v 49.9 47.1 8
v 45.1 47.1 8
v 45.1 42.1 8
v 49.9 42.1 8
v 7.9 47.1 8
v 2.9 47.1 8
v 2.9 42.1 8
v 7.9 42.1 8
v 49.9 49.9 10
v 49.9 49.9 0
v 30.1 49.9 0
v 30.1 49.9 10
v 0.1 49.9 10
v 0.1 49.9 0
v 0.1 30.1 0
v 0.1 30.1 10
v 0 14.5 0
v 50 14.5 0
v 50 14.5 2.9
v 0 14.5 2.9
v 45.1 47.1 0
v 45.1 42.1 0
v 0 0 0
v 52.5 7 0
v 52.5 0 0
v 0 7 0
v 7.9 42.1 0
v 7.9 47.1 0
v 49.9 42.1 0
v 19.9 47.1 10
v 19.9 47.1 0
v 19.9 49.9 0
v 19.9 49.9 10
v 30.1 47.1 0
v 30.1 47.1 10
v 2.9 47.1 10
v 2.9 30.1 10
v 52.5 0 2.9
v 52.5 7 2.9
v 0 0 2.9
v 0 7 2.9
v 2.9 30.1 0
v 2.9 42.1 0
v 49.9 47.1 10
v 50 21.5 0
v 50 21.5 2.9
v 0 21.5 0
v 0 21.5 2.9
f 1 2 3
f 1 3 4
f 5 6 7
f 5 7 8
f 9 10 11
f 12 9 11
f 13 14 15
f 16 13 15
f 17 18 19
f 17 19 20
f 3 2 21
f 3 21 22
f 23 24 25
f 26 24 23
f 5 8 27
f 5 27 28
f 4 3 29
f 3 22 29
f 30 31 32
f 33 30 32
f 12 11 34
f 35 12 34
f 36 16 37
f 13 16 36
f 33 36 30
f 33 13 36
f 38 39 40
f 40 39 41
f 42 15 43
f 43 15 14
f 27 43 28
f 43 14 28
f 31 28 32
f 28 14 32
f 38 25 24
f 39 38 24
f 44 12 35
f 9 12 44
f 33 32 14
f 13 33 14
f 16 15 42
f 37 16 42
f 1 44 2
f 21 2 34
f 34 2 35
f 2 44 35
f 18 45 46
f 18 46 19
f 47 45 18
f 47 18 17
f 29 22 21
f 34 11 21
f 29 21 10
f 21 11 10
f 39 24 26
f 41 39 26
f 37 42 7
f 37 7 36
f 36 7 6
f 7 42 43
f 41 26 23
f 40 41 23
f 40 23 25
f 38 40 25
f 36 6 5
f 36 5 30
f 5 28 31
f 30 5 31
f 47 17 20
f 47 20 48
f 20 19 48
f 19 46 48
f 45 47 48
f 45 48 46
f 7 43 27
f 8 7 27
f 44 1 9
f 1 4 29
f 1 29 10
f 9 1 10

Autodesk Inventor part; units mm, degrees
ref_plane "YZ Plane" through (0, 0, 0) normal (1, 0, 0) x (0, 1, 0)
ref_plane "XZ Plane" through (0, 0, 0) normal (0, 1, 0) x (-1, 0, 0)
ref_plane "XY Plane" through (0, 0, 0) normal (0, 0, 1) x (1, 0, 0)
sketch "Esboço1" plane through (0, 0, 0) normal (0, 0, 1) x (1, 0, 0)
  line L0 (0, 20) -> (0, 0)
  line L1 (45, 0) -> (45, 5)
  line L2 (45, 5) -> (50, 5)
  line L3 (50, 5) -> (50, 0)
  line L4 (50, 0) -> (45, 0)
  line L5 (0, 30) -> (0, 50)
  line L6 (8, 47) -> (8, 42)
  line L7 (8, 42) -> (3, 42)
  line L8 (3, 42) -> (3, 30)
  line L9 (3, 30) -> (0, 30)
  line L10 (30, 50) -> (50, 50)
  line L11 (50, 50) -> (50, 42)
  line L12 (50, 42) -> (45, 42)
  line L13 (45, 42) -> (45, 47)
  line L14 (45, 47) -> (30, 47)
  line L15 (30, 47) -> (30, 50)
  line L16 (0, 50) -> (20, 50)
  line L17 (20, 50) -> (20, 47)
  line L18 (20, 47) -> (8, 47)
  line L19 (0, 20) -> (3, 20)
  line L20 (3, 20) -> (3, 5)
  line L21 (0, 0) -> (8, 0)
  line L22 (8, 0) -> (8, 5)
  line L23 (8, 5) -> (3, 5)
  line L24 (0.1, 49.9) -> (0.1, 30.1)
  line L25 (0.1, 30.1) -> (2.9, 30.1)
  line L26 (2.9, 30.1) -> (2.9, 42.1)
  line L27 (2.9, 42.1) -> (7.9, 42.1)
  line L28 (7.9, 42.1) -> (7.9, 47.1)
  line L29 (7.9, 47.1) -> (19.9, 47.1)
  line L30 (19.9, 47.1) -> (19.9, 49.9)
  line L31 (19.9, 49.9) -> (0.1, 49.9)
  line L32 (30.1, 49.9) -> (30.1, 47.1)
  line L33 (30.1, 47.1) -> (45.1, 47.1)
  line L34 (45.1, 47.1) -> (45.1, 42.1)
  line L35 (45.1, 42.1) -> (49.9, 42.1)
  line L36 (49.9, 42.1) -> (49.9, 49.9)
  line L37 (49.9, 49.9) -> (30.1, 49.9)
  line L38 (45.1, 4.9) -> (45.1, 0.1)
  line L39 (45.1, 0.1) -> (49.9, 0.1)
  line L40 (49.9, 0.1) -> (49.9, 4.9)
  line L41 (49.9, 4.9) -> (45.1, 4.9)
  line L42 (0.1, 19.9) -> (0.1, 0.1)
  line L43 (0.1, 0.1) -> (7.9, 0.1)
  line L44 (7.9, 0.1) -> (7.9, 4.9)
  line L45 (7.9, 4.9) -> (2.9, 4.9)
  line L46 (2.9, 4.9) -> (2.9, 19.9)
  line L47 (2.9, 19.9) -> (0.1, 19.9)
  dimension "d3" = 10
  dimension "d4" = 20
  dimension "d6" = 20
  dimension "d7" = 5
  dimension "d8" = 5
  dimension "d9" = 3
  dimension "d10" = 3
  dimension "d11" = 20
  dimension "d14" = 5
  dimension "d15" = 5
  dimension "d16" = 3
  dimension "d17" = 5
  dimension "d18" = 5
  dimension "d19" = 3
  dimension "d20" = 5
  dimension "d21" = 20
  dimension "d22" = 10
  dimension "d23" = 5
  dimension "d33" = 0.1
  dimension "d34" = 0.1
  dimension "d35" = 0.1
  dimension "d36" = 0.1
  dimension "d37" = 0.1
  dimension "d38" = 0.1
  dimension "d40" = 0.1
  dimension "d41" = 0.1
  dimension "d43" = 0.1
  dimension "d44" = 0.1
  dimension "d45" = 0.1
  dimension "d46" = 0.1
  dimension "d47" = 0.1
  dimension "d48" = 0.1
  dimension "d49" = 0.1
  dimension "d50" = 0.1
  dimension "d51" = 0.1
  dimension "d52" = 0.1
  dimension "d53" = 0.1
  dimension "d54" = 0.1
  dimension "d55" = 0.1
  dimension "d56" = 0.1
extrude "Extrusão3" add sketch "Esboço1" along normal blind 10 contours L31 L30 L29 L28 L27 L26 L25 L24 | L37 L36 L35 L34 L33 L32 | L41 L40 L39 L38 | L47 L46 L45 L44 L43 L42
sketch "Esboço3" plane through (0, 0, 10) normal (0, 0, 1) x (1, 0, 0)
  line L0 (7.9, 0.1) -> (7.9, 4.9) projected
  line L1 (7.9, 4.9) -> (2.9, 4.9)
  line L2 (2.9, 4.9) -> (2.9, 0.1)
  line L3 (2.9, 0.1) -> (7.9, 0.1)
  line L4 (7.9, 0.1) -> (7.9, 4.9)
  line L5 (49.9, 4.9) -> (45.1, 4.9) projected
  line L6 (45.1, 0.1) -> (49.9, 0.1) projected
  line L7 (45.1, 4.9) -> (49.9, 4.9)
  line L8 (49.9, 4.9) -> (49.9, 0.1)
  line L9 (49.9, 0.1) -> (45.1, 0.1)
  line L10 (45.1, 0.1) -> (45.1, 4.9)
  line L11 (50.9, 47.1) -> (45.1, 47.1)
  line L12 (46.1, 42.1) -> (49.9, 42.1)
  line L13 (45.1, 47.1) -> (49.9, 47.1)
  line L14 (49.9, 47.1) -> (49.9, 42.1)
  line L15 (49.9, 42.1) -> (45.1, 42.1)
  line L16 (45.1, 42.1) -> (45.1, 47.1)
  line L17 (45.1, 42.1) -> (49.9, 42.1) projected
  line L18 (49.9, 42.1) -> (49.9, 49.9) projected
  line L19 (7.9, 42.1) -> (2.9, 42.1)
  line L20 (2.9, 42.1) -> (2.9, 47.1)
  line L21 (2.9, 47.1) -> (7.9, 47.1)
  line L22 (7.9, 47.1) -> (7.9, 42.1)
  line L23 (7.9, 47.1) -> (19.9, 47.1) projected
  line L24 (2.9, 30.1) -> (2.9, 42.1) projected
  point P0 (0, 0)
  dimension "d60" = 4.8
  dimension "d61" = 5
  dimension "d62" = 4.8
  dimension "d63" = 5
extrude "Extrusão4" cut sketch "Esboço3" against normal blind 2
sketch "Esboço4" plane through (0, 0, 10) normal (0, 0, 1) x (1, 0, 0)
  line L0 (-10.899, 26.671) -> (68.9569, 26.671)
  line L1 (68.9569, 26.671) -> (68.9569, -16.1913)
  line L2 (68.9569, -16.1913) -> (-10.899, -16.1913)
  line L3 (-10.899, -16.1913) -> (-10.899, 26.671)
  point P0 (0, 0)
extrude "Extrusão5" cut sketch "Esboço4" against normal blind 20
sketch "Esboço5" plane through (0, 0, 0) normal (0, 0, -1) x (-1, 0, 0)
  line L0 (0, 0) -> (-52.5, 0)
  line L1 (-52.5, 0) -> (-52.5, 7)
  line L2 (-52.5, 7) -> (0, 7)
  line L3 (0, 7) -> (0, 0)
  line L4 (0, 21.5) -> (-50, 21.5)
  line L5 (-50, 21.5) -> (-50, 14.5)
  line L6 (-50, 14.5) -> (0, 14.5)
  line L7 (0, 14.5) -> (0, 21.5)
  line L8 (-0.1, 30.1) -> (-2.9, 30.1) projected
  dimension "d68" = 52.5
  dimension "d69" = 50
  dimension "d72" = 7
  dimension "d73" = 7
  dimension "d74" = 7.5
extrude "Extrusão6" add sketch "Esboço5" against normal blind 2.9
properties part number "Suporte_proto"
